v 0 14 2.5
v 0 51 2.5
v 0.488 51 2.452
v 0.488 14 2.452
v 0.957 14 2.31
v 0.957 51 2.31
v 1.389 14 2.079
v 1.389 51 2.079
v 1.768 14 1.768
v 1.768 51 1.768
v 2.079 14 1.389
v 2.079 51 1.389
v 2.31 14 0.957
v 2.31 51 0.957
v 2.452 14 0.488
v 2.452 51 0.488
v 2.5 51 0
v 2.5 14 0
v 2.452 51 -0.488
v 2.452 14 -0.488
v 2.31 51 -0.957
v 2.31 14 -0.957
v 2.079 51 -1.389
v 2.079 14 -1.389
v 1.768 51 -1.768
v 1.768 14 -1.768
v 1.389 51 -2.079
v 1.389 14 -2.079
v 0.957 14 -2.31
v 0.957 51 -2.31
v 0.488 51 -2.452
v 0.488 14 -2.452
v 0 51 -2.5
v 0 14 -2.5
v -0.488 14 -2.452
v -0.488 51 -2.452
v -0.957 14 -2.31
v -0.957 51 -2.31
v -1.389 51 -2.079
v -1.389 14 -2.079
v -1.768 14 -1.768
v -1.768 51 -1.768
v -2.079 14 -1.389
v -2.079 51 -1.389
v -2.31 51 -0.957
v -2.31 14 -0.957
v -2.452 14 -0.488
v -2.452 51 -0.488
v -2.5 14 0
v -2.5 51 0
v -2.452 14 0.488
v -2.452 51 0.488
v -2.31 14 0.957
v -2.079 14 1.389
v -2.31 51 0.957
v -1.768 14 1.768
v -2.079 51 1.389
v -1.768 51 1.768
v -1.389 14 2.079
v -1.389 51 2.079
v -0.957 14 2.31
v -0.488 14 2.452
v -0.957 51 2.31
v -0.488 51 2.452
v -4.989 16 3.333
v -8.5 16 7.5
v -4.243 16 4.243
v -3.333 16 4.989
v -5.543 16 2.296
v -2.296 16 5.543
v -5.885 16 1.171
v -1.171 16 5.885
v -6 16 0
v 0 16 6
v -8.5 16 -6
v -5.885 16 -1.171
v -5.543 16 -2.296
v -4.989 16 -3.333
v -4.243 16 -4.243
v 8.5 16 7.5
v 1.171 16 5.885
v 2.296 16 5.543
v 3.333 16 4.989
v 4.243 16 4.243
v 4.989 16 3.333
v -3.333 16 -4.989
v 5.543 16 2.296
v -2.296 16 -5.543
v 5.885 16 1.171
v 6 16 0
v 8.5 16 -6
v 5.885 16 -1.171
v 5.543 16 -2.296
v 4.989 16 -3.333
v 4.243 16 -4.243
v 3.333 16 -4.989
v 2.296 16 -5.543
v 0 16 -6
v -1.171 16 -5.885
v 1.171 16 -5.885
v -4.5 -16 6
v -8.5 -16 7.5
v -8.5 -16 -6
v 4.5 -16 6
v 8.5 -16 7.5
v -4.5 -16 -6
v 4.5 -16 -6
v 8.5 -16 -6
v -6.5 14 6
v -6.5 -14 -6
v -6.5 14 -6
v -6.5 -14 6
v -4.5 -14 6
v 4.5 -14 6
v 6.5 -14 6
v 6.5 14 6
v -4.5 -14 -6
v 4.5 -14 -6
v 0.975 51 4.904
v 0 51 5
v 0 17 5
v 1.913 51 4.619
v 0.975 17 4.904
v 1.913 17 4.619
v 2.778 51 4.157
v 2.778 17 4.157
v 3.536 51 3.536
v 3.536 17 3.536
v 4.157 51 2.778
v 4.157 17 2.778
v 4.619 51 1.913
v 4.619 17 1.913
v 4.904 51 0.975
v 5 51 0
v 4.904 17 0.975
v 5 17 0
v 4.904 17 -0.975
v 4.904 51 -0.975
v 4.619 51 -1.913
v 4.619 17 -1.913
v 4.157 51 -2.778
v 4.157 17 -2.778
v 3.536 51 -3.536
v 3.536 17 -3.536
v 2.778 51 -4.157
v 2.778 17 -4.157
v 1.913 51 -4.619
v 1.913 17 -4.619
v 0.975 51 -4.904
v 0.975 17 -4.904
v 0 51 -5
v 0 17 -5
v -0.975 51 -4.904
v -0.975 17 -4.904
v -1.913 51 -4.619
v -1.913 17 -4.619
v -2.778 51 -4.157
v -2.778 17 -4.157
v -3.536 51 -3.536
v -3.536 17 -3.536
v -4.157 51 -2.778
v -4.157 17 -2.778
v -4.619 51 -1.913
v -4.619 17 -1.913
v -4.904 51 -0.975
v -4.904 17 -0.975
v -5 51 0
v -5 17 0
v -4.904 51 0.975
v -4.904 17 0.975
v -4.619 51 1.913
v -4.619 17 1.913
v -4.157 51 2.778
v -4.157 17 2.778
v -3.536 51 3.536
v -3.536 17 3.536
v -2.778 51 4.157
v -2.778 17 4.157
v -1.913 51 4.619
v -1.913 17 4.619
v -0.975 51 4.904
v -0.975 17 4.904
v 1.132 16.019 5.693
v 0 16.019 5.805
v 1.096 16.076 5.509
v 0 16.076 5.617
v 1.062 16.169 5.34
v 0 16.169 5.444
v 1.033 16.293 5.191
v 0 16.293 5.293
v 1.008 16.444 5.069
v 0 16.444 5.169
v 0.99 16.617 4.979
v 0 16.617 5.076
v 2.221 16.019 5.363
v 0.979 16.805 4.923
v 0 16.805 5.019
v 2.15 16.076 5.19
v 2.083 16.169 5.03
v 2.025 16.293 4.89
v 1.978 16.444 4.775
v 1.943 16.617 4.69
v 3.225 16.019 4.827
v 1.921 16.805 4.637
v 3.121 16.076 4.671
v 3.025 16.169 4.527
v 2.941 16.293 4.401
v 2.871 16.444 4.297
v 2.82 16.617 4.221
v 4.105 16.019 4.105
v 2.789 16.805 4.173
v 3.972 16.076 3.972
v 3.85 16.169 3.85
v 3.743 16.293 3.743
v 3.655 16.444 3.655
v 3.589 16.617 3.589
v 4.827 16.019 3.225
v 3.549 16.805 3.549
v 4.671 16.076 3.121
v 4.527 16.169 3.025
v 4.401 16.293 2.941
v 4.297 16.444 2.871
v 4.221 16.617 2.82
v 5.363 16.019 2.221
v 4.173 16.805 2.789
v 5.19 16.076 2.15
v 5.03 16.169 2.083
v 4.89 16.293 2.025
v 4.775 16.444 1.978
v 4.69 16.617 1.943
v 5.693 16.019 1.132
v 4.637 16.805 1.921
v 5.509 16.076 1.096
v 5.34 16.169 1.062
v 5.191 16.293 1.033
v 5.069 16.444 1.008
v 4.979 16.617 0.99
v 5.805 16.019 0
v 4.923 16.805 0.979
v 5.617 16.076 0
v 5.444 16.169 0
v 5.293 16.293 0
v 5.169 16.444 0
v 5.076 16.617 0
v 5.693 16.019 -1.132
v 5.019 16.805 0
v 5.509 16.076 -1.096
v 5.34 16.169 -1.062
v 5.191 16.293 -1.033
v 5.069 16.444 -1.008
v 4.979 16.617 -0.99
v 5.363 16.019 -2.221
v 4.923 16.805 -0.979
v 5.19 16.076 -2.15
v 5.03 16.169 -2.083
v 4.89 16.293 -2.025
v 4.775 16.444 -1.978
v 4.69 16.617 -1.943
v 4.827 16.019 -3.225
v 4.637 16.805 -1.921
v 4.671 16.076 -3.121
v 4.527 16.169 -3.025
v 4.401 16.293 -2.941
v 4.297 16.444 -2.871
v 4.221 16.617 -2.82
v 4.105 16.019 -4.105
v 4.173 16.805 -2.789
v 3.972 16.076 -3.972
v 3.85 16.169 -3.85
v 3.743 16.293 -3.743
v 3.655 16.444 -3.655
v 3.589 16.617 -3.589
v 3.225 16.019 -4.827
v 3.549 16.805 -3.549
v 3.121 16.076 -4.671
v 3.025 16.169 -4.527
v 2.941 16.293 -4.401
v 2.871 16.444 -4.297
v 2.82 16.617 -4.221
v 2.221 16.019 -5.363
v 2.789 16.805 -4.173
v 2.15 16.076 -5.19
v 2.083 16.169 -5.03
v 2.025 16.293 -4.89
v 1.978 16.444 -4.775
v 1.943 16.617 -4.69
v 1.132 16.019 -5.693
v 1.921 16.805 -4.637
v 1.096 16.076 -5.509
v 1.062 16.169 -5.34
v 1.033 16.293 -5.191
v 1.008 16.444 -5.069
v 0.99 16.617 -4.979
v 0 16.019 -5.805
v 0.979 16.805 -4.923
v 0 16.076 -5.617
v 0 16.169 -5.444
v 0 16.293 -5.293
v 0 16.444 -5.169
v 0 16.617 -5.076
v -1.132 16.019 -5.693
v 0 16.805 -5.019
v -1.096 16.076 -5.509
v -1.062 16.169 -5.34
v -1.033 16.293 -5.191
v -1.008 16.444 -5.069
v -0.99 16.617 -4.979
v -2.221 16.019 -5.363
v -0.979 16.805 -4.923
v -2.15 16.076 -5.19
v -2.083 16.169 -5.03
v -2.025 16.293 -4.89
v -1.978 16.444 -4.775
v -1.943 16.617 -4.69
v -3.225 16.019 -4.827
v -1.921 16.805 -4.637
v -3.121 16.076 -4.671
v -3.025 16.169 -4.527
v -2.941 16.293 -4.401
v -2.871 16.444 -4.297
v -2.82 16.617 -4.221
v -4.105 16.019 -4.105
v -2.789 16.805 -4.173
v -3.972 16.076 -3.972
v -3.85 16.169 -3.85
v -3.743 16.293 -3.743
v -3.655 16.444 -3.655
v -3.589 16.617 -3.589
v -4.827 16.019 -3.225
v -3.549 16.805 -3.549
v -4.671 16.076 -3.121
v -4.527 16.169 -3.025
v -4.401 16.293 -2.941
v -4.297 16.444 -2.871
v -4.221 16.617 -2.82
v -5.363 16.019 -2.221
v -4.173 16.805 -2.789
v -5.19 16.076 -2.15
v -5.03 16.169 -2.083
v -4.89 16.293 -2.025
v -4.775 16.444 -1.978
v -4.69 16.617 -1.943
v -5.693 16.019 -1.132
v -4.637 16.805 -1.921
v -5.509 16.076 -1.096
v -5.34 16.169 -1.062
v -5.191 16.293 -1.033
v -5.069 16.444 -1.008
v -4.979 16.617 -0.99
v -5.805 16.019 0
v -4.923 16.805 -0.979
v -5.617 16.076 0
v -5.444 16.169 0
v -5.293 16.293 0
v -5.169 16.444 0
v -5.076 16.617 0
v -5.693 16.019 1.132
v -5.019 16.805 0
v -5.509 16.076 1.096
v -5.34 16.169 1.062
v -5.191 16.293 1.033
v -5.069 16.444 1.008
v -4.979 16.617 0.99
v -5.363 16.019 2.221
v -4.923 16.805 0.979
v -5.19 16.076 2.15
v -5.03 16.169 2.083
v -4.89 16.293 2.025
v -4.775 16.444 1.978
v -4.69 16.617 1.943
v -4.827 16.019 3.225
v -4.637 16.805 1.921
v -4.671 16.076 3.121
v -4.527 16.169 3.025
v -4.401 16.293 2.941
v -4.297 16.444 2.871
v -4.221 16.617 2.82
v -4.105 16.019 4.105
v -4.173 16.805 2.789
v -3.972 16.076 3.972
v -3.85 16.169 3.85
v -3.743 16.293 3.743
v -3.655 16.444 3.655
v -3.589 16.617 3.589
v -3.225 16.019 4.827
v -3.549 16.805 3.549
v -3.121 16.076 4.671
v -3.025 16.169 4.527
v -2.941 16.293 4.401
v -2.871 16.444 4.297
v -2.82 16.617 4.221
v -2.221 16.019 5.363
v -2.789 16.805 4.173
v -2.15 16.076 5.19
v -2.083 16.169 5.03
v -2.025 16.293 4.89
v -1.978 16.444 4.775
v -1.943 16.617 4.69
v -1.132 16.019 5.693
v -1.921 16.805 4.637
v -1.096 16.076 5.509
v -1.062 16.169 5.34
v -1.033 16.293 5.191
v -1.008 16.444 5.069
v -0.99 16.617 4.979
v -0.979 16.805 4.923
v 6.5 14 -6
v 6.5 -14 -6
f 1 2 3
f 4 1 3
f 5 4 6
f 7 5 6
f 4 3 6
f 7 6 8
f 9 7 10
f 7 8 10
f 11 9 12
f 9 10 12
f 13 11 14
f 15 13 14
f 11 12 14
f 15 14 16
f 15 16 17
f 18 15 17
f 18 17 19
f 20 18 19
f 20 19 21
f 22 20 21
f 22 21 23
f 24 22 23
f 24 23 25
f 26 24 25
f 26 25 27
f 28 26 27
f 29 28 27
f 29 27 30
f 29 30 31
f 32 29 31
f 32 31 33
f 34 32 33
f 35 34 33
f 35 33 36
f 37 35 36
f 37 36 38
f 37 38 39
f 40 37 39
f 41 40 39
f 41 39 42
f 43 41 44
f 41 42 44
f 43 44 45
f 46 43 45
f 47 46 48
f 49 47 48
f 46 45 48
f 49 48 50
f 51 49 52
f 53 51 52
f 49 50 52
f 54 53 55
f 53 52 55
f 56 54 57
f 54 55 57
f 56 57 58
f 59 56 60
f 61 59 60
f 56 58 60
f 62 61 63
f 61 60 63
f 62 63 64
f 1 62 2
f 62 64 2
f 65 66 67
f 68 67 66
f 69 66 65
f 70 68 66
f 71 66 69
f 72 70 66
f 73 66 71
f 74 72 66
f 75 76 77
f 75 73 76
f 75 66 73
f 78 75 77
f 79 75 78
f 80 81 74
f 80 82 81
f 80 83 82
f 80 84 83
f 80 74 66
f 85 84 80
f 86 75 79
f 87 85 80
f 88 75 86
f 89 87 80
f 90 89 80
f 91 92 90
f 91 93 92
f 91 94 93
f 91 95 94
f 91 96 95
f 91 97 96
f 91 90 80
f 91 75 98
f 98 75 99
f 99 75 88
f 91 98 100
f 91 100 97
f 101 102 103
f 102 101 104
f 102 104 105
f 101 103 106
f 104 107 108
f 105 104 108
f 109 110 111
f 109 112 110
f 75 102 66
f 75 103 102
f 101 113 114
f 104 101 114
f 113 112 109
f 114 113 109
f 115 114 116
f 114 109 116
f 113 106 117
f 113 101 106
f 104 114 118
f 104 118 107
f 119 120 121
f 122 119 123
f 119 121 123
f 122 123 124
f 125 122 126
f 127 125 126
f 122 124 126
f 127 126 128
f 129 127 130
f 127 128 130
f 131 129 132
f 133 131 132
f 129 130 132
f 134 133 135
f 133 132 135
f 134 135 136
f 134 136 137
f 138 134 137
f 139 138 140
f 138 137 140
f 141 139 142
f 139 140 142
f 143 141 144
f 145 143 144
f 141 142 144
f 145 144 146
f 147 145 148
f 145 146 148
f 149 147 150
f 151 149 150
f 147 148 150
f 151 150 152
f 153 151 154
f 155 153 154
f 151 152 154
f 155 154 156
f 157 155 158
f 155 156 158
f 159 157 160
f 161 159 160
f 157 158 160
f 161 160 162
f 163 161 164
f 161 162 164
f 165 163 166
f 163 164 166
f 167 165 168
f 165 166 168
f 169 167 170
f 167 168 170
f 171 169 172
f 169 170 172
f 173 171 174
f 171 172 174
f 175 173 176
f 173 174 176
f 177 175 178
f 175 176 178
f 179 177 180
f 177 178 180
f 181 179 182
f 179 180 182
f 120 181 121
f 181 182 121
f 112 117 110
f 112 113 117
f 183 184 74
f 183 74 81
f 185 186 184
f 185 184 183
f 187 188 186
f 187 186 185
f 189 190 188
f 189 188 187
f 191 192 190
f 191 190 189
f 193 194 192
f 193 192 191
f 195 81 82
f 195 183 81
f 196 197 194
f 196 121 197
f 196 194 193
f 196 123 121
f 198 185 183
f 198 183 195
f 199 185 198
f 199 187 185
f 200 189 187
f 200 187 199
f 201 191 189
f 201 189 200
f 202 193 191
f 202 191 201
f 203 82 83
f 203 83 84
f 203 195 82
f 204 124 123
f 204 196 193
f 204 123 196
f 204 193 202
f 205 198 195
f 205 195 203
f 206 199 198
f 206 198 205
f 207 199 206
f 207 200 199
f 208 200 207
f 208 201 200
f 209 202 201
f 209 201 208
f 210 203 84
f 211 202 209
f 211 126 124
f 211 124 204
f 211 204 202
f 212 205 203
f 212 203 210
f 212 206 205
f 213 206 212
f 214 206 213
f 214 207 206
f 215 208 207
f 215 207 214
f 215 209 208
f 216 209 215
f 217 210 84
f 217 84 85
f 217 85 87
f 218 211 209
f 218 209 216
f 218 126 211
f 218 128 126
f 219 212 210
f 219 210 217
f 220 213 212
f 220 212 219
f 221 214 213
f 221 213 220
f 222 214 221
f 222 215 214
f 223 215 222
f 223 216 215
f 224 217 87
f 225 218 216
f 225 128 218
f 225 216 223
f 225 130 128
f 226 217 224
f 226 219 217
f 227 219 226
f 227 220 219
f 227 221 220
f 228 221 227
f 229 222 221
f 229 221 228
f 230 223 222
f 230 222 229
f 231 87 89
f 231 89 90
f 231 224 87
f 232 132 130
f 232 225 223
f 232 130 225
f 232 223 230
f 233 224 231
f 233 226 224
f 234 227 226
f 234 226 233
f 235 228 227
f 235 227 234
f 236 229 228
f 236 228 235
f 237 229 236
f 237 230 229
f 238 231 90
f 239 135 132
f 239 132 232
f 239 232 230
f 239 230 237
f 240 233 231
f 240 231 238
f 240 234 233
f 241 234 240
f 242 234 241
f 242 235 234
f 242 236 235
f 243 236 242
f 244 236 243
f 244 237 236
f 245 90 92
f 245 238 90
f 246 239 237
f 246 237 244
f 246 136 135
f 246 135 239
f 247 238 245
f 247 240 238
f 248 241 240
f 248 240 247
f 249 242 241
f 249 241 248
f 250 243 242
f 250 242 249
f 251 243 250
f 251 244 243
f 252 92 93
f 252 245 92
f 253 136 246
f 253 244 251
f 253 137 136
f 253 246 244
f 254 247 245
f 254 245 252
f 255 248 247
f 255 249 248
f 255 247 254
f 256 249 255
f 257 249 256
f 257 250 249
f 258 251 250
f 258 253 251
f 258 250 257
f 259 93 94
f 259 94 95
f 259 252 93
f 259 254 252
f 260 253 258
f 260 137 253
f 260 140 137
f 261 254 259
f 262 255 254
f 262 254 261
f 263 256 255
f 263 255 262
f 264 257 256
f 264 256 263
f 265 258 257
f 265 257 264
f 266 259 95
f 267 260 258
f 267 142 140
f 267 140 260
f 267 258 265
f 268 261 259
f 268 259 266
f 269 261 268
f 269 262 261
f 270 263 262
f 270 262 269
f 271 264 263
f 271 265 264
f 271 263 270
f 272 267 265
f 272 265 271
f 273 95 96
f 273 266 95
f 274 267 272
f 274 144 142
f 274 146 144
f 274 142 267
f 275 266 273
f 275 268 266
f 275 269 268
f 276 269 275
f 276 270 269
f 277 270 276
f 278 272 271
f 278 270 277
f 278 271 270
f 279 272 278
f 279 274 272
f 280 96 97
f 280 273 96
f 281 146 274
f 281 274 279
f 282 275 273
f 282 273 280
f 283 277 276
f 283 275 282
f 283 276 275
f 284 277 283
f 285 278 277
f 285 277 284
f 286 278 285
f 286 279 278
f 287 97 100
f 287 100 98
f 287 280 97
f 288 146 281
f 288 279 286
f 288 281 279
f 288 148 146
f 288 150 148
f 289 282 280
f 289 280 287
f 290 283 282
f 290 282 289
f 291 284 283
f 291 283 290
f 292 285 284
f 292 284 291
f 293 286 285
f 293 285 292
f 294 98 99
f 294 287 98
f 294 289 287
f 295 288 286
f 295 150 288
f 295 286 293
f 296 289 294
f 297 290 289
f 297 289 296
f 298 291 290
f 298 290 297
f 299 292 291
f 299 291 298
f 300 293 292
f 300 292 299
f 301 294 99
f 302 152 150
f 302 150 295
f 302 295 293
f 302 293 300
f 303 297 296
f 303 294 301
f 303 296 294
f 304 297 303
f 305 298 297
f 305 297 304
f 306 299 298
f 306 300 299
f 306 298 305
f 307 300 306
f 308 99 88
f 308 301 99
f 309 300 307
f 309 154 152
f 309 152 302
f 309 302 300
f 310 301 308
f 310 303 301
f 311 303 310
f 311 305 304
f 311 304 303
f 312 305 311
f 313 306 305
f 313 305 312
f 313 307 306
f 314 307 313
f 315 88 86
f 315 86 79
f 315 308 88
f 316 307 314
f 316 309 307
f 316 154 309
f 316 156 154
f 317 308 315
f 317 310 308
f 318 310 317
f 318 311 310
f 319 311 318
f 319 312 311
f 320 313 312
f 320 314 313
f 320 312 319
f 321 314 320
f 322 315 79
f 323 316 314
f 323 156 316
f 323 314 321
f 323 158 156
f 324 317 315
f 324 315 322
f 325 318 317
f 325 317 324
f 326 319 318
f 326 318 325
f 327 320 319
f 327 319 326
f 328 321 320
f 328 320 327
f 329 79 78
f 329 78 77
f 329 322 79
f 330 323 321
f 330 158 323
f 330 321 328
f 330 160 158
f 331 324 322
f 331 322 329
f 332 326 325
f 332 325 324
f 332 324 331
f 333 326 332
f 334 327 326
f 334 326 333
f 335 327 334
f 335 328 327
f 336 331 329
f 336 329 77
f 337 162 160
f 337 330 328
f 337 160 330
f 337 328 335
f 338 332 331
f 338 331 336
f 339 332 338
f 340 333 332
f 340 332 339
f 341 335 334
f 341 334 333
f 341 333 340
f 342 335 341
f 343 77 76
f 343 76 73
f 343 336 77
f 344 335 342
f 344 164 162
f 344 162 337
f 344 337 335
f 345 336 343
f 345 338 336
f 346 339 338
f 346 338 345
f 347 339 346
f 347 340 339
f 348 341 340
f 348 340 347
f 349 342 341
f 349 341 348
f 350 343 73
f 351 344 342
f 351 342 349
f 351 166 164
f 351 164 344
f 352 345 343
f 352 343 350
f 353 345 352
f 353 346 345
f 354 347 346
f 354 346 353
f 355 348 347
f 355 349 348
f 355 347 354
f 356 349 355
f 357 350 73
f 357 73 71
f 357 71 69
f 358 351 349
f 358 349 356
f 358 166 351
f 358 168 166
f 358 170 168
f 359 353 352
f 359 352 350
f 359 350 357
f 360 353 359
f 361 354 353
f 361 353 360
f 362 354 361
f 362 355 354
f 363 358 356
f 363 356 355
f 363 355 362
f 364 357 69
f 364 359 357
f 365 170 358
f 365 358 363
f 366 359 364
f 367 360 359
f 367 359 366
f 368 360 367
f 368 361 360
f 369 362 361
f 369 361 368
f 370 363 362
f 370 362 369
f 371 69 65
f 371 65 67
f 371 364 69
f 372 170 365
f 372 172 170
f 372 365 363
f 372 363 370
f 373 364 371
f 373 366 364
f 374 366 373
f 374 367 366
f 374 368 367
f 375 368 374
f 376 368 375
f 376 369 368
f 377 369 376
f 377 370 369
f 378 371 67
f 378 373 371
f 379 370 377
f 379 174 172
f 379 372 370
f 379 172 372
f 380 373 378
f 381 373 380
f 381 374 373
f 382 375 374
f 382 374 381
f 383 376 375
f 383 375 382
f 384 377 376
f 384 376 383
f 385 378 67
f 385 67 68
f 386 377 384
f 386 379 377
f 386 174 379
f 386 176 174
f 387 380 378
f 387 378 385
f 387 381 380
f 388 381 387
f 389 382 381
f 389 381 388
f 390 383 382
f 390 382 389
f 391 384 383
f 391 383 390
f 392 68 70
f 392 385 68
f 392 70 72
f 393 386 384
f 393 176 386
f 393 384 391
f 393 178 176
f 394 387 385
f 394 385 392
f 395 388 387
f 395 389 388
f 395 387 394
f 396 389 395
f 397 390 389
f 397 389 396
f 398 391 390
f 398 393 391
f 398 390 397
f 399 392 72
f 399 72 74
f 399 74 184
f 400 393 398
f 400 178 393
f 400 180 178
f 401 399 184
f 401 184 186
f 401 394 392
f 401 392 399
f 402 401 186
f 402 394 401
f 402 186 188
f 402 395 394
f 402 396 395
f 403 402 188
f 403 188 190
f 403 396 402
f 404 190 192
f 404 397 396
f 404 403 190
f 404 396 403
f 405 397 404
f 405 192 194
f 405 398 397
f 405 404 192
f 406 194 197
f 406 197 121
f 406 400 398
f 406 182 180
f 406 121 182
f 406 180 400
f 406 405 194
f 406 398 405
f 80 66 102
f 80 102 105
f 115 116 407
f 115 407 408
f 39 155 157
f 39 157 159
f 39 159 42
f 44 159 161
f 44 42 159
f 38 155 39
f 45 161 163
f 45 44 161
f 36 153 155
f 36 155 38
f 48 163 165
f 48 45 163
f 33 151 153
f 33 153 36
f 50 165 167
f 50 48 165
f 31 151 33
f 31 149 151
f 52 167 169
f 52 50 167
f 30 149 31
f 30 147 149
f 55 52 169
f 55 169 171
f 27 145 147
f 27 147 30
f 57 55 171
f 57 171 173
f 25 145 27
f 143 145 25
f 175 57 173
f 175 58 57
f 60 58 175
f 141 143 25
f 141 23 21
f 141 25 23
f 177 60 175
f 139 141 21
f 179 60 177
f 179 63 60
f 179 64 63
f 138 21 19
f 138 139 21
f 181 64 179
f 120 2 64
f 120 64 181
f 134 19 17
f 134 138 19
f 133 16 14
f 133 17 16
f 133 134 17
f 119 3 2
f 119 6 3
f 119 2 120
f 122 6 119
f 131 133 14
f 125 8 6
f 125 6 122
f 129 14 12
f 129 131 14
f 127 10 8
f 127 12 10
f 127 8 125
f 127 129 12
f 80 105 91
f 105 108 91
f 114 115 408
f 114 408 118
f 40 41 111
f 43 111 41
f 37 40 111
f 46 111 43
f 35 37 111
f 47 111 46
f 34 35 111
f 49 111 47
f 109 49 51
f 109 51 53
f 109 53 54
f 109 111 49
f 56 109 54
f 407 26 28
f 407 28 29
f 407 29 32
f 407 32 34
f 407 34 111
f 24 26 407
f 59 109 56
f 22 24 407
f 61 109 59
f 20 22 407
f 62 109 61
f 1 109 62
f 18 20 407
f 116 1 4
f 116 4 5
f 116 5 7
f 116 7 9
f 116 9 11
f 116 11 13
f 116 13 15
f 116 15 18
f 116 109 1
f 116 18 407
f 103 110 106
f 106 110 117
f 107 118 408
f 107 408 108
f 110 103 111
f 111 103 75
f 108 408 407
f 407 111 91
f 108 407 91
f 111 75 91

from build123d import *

# Parameters (mm, degrees)
BOSS_EXTRUDE1_DEPTH = 6
SKETCH2_R           = 5
BOSS_EXTRUDE2_DEPTH = 35
FILLET1_R           = 1
SKETCH3_W           = 17
SKETCH3_H           = 32
BOSS_EXTRUDE3_DEPTH = 1.5
CUT_EXTRUDE1_REACH  = 69.952
SKETCH4_R           = 2.5


with BuildPart() as part:
    # Sketch1 → Boss-Extrude1 (new, symmetric)
    with BuildSketch(Plane.XY):
        Polygon((-6.5, -14), (-6.5, 14), (6.5, 14), (6.5, -14), (4.5, -14), (4.5, -16), (8.5, -16), (8.5, 16), (-8.5, 16), (-8.5, -16), (-4.5, -16), (-4.5, -14), align=None)
    extrude(amount=BOSS_EXTRUDE1_DEPTH, both=True)

    # Sketch2 → Boss-Extrude2 (add)
    with BuildSketch(Plane(origin=(0, 16, 0), x_dir=(1, 0, 0), z_dir=(0, 1, 0))):
        with Locations(Location((0, 0, 0), (0, 0, 270))):
            Circle(SKETCH2_R)
    extrude(amount=BOSS_EXTRUDE2_DEPTH)

    # Fillet1
    fillet1_edges = [part.edges().sort_by_distance(p)[0] for p in [
        (0, 16, -5),
    ]]
    fillet(fillet1_edges, radius=FILLET1_R - 0.0001)  # a hair under: the kernel refuses the full size

    # Sketch3 → Boss-Extrude3 (add)
    with BuildSketch(Plane.XY.offset(6)):
        Rectangle(SKETCH3_W, SKETCH3_H)
    extrude(amount=BOSS_EXTRUDE3_DEPTH)

    # Sketch4 → Cut-Extrude1 (cut, up to next)
    with BuildSketch(Plane(origin=(0, 51, 0), x_dir=(1, 0, 0), z_dir=(0, 1, 0)), mode=Mode.PRIVATE) as cut_extrude1_sk1:
        with Locations(Location((0, 0, 0), (0, 0, 270))):
            Circle(SKETCH4_R)
    cut_extrude1_tool1 = extrude(cut_extrude1_sk1.sketch, amount=-CUT_EXTRUDE1_REACH, mode=Mode.PRIVATE) & part.part
    add(cut_extrude1_tool1.solids().sort_by_distance((0, 51, 0))[0], mode=Mode.SUBTRACT)


solid = part.part
